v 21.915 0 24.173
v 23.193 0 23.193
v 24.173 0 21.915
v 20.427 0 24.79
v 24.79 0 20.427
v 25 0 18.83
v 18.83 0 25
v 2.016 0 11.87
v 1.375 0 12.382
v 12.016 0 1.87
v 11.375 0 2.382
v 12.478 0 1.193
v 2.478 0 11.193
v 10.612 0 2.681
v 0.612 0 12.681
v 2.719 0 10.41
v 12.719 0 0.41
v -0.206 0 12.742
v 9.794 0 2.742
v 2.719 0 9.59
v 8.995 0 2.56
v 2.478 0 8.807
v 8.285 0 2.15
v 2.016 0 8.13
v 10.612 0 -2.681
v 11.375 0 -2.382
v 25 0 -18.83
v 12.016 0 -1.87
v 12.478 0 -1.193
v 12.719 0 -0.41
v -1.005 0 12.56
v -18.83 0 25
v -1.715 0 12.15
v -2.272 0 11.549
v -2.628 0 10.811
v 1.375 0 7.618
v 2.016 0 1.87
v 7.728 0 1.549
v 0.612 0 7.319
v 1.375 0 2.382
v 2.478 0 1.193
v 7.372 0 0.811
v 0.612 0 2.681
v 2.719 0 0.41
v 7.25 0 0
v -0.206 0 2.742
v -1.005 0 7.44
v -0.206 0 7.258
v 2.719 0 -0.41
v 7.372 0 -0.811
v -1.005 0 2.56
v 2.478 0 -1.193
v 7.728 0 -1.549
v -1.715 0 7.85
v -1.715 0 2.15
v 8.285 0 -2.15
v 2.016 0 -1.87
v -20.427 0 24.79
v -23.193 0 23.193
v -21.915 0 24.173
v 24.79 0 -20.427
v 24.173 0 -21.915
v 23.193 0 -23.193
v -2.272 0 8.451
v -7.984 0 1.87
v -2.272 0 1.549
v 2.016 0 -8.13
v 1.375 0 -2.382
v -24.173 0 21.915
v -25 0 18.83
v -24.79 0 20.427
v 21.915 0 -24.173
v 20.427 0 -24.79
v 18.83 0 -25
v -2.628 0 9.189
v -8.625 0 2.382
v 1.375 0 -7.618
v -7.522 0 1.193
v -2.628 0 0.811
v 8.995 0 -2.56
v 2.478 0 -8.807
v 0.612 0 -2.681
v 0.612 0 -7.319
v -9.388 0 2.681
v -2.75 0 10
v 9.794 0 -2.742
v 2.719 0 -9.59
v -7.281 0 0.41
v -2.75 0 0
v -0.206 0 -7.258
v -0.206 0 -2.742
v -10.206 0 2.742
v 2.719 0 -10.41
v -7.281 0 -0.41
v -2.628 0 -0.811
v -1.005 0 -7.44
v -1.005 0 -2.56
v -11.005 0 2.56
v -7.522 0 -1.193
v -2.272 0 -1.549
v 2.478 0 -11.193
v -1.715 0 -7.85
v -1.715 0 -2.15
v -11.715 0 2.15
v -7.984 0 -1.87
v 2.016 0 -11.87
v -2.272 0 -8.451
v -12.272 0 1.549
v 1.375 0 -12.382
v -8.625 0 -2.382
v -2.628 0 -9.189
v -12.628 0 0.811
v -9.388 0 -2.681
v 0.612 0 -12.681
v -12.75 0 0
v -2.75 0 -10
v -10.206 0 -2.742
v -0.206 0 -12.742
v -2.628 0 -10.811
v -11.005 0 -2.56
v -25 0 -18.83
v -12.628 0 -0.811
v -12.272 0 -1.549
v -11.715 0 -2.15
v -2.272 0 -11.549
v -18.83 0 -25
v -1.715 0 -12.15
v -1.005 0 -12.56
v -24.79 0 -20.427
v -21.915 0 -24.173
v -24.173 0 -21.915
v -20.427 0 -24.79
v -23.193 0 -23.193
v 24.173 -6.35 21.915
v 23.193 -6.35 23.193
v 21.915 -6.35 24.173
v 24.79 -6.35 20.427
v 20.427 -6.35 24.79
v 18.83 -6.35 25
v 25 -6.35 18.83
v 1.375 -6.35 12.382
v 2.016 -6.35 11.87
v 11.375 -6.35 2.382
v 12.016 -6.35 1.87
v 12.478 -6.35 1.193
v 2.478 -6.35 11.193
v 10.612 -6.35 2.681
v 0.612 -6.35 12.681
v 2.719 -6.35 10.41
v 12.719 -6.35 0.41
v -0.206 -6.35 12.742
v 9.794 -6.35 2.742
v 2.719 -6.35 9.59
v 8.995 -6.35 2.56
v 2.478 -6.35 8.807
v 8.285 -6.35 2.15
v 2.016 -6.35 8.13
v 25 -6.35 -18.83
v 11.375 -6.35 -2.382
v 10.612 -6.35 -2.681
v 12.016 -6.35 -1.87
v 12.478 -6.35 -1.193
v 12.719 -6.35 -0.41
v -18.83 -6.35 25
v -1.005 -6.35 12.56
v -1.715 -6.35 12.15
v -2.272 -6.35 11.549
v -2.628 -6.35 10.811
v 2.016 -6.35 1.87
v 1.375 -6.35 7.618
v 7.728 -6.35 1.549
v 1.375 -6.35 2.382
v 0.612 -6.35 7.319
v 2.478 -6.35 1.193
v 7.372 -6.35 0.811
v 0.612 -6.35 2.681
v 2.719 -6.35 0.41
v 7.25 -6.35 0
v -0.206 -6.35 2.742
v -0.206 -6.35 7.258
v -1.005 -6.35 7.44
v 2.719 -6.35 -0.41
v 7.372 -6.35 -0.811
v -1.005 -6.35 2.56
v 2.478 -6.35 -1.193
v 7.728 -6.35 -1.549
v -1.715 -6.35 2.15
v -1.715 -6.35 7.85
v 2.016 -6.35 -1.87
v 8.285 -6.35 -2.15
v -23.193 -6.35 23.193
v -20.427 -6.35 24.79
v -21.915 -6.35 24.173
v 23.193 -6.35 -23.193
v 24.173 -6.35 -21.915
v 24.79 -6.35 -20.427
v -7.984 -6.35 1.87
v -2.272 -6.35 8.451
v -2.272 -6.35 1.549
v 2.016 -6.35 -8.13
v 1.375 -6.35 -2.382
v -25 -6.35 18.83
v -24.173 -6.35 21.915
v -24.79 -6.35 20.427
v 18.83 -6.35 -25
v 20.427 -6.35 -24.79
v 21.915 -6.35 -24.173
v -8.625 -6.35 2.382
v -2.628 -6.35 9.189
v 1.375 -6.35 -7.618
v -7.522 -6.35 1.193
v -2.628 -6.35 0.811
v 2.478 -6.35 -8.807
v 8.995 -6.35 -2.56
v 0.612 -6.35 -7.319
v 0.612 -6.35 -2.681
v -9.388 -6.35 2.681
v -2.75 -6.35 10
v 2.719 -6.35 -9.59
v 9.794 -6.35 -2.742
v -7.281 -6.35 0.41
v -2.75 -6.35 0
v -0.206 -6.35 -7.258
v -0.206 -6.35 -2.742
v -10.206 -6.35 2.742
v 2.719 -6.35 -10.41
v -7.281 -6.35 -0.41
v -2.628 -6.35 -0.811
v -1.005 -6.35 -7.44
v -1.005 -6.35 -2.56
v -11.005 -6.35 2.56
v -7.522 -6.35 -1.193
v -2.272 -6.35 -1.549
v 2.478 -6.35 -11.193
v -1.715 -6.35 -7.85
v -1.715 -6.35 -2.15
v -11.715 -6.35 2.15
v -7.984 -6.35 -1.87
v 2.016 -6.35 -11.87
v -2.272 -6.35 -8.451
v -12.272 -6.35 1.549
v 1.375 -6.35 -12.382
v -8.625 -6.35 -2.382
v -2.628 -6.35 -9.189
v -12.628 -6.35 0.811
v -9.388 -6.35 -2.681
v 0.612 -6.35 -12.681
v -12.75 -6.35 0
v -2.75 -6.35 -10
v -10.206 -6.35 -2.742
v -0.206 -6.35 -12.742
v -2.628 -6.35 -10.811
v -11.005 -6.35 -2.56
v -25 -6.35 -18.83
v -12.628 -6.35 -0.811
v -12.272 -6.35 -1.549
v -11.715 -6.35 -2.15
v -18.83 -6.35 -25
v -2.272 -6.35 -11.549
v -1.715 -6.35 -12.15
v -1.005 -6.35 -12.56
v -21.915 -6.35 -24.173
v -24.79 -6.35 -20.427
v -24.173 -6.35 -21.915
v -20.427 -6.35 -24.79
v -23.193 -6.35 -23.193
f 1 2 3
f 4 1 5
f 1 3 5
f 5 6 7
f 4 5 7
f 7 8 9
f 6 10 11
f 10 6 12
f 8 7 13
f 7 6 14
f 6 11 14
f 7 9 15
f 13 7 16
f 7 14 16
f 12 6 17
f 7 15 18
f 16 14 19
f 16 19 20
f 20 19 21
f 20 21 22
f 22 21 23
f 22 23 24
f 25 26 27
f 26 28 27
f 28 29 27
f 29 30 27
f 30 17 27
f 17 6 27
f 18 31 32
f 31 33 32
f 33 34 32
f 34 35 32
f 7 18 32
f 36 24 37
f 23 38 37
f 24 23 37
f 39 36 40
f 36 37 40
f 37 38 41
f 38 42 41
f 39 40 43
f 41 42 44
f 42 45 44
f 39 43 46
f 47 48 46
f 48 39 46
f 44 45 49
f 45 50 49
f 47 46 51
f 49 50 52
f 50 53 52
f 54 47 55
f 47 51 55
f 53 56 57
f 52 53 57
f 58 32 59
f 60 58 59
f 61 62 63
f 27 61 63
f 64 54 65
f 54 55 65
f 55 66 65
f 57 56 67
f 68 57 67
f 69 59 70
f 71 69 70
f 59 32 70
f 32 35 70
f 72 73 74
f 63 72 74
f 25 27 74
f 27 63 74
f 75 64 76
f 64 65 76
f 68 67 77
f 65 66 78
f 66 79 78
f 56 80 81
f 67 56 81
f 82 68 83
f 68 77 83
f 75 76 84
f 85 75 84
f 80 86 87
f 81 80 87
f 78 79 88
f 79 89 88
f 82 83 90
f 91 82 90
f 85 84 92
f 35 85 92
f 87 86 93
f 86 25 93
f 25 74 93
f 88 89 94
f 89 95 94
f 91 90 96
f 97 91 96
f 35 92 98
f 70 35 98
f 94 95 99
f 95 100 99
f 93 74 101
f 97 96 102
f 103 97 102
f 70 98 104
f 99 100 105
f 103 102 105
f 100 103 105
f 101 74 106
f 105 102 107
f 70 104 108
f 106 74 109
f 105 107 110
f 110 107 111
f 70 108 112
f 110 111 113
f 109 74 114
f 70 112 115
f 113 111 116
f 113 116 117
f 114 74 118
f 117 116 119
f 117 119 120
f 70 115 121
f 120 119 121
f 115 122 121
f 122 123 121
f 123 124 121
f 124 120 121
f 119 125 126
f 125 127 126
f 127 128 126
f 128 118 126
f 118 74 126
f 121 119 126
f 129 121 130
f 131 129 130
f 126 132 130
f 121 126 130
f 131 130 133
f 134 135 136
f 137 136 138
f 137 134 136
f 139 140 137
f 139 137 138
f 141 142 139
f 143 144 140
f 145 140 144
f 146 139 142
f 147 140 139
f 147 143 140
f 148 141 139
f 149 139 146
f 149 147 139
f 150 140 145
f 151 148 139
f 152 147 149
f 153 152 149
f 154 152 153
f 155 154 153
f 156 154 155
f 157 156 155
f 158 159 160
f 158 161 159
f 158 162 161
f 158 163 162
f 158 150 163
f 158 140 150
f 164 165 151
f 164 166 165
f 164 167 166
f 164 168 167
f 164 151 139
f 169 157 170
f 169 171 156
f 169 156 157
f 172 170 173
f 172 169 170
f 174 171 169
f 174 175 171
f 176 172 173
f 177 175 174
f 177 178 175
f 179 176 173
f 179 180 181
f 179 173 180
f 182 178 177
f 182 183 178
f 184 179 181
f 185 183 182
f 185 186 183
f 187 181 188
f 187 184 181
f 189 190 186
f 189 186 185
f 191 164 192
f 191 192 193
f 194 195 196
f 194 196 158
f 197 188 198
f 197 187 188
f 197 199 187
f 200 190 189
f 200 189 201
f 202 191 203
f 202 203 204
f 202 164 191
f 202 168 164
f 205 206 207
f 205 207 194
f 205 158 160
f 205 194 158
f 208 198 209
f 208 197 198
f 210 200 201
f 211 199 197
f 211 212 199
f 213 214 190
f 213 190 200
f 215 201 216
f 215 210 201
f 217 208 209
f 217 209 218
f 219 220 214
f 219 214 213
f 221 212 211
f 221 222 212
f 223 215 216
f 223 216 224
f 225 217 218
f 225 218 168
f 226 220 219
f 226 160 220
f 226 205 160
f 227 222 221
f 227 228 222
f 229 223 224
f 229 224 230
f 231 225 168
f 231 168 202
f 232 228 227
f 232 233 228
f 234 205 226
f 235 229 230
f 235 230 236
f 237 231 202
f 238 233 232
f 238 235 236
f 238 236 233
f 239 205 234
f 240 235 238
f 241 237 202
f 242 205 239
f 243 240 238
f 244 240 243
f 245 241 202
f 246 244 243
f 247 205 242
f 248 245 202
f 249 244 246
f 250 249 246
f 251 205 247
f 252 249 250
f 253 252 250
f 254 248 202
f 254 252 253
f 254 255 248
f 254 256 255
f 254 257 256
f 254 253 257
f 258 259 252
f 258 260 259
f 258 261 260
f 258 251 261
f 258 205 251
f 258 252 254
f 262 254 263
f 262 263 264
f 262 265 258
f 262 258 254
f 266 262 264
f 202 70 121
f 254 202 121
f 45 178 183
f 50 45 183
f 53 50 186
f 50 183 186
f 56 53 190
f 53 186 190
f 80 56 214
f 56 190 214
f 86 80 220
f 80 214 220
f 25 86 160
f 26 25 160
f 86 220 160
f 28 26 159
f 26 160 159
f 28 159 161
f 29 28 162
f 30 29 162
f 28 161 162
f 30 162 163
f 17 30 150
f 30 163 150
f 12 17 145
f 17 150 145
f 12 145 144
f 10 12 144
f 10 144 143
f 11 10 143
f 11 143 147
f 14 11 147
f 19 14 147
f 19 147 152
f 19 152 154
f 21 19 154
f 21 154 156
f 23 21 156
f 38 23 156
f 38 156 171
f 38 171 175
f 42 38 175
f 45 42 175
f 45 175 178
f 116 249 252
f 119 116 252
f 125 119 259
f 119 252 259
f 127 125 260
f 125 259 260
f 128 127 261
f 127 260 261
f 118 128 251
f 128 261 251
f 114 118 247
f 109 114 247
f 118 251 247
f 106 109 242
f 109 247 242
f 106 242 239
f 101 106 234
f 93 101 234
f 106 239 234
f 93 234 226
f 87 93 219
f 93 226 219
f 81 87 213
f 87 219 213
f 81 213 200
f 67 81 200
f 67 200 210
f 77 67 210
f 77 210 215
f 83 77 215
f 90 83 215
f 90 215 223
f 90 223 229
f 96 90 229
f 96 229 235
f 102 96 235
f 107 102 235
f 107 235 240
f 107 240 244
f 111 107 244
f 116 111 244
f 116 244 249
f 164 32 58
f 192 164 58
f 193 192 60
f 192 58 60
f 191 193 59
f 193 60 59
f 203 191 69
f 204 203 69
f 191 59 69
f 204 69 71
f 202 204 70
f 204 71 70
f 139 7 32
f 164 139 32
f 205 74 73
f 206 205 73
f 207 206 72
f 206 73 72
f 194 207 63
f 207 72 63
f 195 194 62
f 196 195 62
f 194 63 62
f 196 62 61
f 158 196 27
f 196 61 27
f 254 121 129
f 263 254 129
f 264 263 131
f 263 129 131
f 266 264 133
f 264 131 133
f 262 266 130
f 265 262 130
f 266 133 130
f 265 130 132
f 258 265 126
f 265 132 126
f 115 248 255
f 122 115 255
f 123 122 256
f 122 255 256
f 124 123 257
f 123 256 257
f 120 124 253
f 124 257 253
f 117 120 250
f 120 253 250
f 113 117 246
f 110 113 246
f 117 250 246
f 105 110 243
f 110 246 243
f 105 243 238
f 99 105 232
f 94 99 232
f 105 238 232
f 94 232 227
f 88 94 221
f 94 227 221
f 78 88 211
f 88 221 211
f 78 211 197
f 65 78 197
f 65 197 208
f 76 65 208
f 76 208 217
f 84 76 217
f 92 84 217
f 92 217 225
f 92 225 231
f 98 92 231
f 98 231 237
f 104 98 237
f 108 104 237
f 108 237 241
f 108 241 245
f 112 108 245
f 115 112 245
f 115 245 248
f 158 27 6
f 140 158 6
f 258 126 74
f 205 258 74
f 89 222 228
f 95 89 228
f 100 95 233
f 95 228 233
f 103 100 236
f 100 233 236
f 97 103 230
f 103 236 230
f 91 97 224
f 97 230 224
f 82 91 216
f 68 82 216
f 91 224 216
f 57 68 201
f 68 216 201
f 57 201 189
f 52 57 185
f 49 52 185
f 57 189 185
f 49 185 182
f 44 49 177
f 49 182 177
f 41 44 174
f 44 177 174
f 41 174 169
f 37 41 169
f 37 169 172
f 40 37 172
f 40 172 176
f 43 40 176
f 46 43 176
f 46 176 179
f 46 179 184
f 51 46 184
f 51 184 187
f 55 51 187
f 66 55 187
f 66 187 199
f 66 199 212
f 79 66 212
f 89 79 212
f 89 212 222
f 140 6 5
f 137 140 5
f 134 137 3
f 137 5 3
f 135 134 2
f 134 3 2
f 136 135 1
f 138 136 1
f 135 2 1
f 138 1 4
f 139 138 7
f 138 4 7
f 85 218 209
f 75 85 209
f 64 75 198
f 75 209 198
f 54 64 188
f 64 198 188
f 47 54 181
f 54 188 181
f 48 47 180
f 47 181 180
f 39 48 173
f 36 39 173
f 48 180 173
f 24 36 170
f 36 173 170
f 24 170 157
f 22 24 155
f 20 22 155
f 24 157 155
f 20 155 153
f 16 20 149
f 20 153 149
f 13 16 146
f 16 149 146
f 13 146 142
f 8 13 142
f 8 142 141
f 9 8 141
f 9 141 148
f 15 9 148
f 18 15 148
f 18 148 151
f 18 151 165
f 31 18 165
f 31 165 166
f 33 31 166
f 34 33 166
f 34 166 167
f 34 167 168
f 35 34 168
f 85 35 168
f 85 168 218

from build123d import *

# Parameters (mm, degrees)
EXTRUDE_1_DEPTH    = 6.35
HOLE_WIZARD_M5_1_D = 5.5


with BuildPart() as part:
    # 스케치1 → 보스-돌출1 (new body)
    with BuildSketch(Plane(origin=(0, 0, 0), x_dir=(1, 0, 0), z_dir=(0, 1, 0))):
        with BuildLine():
            Line((-18.83, 25), (18.83, 25))
            ThreePointArc((18.83, 25), (23.19284884, 23.19284884), (25, 18.83))
            Line((25, 18.83), (25, -18.83))
            ThreePointArc((25, -18.83), (23.19284884, -23.19284884), (18.83, -25))
            Line((18.83, -25), (-18.83, -25))
            ThreePointArc((-18.83, -25), (-23.19284884, -23.19284884), (-25, -18.83))
            Line((-25, -18.83), (-25, 18.83))
            ThreePointArc((-25, 18.83), (-23.19284884, 23.19284884), (-18.83, 25))
        make_face()
    extrude(amount=-EXTRUDE_1_DEPTH)

    # M5 여유 구멍1 (through all)
    with Locations(Plane(origin=(0, 0, 0), x_dir=(1, 0, 0), z_dir=(0, 1, 0))):
        with Locations((0, 10), (10, 0), (0, -10), (-10, 0), (0, 0)):
            Hole(HOLE_WIZARD_M5_1_D / 2)


solid = part.part
